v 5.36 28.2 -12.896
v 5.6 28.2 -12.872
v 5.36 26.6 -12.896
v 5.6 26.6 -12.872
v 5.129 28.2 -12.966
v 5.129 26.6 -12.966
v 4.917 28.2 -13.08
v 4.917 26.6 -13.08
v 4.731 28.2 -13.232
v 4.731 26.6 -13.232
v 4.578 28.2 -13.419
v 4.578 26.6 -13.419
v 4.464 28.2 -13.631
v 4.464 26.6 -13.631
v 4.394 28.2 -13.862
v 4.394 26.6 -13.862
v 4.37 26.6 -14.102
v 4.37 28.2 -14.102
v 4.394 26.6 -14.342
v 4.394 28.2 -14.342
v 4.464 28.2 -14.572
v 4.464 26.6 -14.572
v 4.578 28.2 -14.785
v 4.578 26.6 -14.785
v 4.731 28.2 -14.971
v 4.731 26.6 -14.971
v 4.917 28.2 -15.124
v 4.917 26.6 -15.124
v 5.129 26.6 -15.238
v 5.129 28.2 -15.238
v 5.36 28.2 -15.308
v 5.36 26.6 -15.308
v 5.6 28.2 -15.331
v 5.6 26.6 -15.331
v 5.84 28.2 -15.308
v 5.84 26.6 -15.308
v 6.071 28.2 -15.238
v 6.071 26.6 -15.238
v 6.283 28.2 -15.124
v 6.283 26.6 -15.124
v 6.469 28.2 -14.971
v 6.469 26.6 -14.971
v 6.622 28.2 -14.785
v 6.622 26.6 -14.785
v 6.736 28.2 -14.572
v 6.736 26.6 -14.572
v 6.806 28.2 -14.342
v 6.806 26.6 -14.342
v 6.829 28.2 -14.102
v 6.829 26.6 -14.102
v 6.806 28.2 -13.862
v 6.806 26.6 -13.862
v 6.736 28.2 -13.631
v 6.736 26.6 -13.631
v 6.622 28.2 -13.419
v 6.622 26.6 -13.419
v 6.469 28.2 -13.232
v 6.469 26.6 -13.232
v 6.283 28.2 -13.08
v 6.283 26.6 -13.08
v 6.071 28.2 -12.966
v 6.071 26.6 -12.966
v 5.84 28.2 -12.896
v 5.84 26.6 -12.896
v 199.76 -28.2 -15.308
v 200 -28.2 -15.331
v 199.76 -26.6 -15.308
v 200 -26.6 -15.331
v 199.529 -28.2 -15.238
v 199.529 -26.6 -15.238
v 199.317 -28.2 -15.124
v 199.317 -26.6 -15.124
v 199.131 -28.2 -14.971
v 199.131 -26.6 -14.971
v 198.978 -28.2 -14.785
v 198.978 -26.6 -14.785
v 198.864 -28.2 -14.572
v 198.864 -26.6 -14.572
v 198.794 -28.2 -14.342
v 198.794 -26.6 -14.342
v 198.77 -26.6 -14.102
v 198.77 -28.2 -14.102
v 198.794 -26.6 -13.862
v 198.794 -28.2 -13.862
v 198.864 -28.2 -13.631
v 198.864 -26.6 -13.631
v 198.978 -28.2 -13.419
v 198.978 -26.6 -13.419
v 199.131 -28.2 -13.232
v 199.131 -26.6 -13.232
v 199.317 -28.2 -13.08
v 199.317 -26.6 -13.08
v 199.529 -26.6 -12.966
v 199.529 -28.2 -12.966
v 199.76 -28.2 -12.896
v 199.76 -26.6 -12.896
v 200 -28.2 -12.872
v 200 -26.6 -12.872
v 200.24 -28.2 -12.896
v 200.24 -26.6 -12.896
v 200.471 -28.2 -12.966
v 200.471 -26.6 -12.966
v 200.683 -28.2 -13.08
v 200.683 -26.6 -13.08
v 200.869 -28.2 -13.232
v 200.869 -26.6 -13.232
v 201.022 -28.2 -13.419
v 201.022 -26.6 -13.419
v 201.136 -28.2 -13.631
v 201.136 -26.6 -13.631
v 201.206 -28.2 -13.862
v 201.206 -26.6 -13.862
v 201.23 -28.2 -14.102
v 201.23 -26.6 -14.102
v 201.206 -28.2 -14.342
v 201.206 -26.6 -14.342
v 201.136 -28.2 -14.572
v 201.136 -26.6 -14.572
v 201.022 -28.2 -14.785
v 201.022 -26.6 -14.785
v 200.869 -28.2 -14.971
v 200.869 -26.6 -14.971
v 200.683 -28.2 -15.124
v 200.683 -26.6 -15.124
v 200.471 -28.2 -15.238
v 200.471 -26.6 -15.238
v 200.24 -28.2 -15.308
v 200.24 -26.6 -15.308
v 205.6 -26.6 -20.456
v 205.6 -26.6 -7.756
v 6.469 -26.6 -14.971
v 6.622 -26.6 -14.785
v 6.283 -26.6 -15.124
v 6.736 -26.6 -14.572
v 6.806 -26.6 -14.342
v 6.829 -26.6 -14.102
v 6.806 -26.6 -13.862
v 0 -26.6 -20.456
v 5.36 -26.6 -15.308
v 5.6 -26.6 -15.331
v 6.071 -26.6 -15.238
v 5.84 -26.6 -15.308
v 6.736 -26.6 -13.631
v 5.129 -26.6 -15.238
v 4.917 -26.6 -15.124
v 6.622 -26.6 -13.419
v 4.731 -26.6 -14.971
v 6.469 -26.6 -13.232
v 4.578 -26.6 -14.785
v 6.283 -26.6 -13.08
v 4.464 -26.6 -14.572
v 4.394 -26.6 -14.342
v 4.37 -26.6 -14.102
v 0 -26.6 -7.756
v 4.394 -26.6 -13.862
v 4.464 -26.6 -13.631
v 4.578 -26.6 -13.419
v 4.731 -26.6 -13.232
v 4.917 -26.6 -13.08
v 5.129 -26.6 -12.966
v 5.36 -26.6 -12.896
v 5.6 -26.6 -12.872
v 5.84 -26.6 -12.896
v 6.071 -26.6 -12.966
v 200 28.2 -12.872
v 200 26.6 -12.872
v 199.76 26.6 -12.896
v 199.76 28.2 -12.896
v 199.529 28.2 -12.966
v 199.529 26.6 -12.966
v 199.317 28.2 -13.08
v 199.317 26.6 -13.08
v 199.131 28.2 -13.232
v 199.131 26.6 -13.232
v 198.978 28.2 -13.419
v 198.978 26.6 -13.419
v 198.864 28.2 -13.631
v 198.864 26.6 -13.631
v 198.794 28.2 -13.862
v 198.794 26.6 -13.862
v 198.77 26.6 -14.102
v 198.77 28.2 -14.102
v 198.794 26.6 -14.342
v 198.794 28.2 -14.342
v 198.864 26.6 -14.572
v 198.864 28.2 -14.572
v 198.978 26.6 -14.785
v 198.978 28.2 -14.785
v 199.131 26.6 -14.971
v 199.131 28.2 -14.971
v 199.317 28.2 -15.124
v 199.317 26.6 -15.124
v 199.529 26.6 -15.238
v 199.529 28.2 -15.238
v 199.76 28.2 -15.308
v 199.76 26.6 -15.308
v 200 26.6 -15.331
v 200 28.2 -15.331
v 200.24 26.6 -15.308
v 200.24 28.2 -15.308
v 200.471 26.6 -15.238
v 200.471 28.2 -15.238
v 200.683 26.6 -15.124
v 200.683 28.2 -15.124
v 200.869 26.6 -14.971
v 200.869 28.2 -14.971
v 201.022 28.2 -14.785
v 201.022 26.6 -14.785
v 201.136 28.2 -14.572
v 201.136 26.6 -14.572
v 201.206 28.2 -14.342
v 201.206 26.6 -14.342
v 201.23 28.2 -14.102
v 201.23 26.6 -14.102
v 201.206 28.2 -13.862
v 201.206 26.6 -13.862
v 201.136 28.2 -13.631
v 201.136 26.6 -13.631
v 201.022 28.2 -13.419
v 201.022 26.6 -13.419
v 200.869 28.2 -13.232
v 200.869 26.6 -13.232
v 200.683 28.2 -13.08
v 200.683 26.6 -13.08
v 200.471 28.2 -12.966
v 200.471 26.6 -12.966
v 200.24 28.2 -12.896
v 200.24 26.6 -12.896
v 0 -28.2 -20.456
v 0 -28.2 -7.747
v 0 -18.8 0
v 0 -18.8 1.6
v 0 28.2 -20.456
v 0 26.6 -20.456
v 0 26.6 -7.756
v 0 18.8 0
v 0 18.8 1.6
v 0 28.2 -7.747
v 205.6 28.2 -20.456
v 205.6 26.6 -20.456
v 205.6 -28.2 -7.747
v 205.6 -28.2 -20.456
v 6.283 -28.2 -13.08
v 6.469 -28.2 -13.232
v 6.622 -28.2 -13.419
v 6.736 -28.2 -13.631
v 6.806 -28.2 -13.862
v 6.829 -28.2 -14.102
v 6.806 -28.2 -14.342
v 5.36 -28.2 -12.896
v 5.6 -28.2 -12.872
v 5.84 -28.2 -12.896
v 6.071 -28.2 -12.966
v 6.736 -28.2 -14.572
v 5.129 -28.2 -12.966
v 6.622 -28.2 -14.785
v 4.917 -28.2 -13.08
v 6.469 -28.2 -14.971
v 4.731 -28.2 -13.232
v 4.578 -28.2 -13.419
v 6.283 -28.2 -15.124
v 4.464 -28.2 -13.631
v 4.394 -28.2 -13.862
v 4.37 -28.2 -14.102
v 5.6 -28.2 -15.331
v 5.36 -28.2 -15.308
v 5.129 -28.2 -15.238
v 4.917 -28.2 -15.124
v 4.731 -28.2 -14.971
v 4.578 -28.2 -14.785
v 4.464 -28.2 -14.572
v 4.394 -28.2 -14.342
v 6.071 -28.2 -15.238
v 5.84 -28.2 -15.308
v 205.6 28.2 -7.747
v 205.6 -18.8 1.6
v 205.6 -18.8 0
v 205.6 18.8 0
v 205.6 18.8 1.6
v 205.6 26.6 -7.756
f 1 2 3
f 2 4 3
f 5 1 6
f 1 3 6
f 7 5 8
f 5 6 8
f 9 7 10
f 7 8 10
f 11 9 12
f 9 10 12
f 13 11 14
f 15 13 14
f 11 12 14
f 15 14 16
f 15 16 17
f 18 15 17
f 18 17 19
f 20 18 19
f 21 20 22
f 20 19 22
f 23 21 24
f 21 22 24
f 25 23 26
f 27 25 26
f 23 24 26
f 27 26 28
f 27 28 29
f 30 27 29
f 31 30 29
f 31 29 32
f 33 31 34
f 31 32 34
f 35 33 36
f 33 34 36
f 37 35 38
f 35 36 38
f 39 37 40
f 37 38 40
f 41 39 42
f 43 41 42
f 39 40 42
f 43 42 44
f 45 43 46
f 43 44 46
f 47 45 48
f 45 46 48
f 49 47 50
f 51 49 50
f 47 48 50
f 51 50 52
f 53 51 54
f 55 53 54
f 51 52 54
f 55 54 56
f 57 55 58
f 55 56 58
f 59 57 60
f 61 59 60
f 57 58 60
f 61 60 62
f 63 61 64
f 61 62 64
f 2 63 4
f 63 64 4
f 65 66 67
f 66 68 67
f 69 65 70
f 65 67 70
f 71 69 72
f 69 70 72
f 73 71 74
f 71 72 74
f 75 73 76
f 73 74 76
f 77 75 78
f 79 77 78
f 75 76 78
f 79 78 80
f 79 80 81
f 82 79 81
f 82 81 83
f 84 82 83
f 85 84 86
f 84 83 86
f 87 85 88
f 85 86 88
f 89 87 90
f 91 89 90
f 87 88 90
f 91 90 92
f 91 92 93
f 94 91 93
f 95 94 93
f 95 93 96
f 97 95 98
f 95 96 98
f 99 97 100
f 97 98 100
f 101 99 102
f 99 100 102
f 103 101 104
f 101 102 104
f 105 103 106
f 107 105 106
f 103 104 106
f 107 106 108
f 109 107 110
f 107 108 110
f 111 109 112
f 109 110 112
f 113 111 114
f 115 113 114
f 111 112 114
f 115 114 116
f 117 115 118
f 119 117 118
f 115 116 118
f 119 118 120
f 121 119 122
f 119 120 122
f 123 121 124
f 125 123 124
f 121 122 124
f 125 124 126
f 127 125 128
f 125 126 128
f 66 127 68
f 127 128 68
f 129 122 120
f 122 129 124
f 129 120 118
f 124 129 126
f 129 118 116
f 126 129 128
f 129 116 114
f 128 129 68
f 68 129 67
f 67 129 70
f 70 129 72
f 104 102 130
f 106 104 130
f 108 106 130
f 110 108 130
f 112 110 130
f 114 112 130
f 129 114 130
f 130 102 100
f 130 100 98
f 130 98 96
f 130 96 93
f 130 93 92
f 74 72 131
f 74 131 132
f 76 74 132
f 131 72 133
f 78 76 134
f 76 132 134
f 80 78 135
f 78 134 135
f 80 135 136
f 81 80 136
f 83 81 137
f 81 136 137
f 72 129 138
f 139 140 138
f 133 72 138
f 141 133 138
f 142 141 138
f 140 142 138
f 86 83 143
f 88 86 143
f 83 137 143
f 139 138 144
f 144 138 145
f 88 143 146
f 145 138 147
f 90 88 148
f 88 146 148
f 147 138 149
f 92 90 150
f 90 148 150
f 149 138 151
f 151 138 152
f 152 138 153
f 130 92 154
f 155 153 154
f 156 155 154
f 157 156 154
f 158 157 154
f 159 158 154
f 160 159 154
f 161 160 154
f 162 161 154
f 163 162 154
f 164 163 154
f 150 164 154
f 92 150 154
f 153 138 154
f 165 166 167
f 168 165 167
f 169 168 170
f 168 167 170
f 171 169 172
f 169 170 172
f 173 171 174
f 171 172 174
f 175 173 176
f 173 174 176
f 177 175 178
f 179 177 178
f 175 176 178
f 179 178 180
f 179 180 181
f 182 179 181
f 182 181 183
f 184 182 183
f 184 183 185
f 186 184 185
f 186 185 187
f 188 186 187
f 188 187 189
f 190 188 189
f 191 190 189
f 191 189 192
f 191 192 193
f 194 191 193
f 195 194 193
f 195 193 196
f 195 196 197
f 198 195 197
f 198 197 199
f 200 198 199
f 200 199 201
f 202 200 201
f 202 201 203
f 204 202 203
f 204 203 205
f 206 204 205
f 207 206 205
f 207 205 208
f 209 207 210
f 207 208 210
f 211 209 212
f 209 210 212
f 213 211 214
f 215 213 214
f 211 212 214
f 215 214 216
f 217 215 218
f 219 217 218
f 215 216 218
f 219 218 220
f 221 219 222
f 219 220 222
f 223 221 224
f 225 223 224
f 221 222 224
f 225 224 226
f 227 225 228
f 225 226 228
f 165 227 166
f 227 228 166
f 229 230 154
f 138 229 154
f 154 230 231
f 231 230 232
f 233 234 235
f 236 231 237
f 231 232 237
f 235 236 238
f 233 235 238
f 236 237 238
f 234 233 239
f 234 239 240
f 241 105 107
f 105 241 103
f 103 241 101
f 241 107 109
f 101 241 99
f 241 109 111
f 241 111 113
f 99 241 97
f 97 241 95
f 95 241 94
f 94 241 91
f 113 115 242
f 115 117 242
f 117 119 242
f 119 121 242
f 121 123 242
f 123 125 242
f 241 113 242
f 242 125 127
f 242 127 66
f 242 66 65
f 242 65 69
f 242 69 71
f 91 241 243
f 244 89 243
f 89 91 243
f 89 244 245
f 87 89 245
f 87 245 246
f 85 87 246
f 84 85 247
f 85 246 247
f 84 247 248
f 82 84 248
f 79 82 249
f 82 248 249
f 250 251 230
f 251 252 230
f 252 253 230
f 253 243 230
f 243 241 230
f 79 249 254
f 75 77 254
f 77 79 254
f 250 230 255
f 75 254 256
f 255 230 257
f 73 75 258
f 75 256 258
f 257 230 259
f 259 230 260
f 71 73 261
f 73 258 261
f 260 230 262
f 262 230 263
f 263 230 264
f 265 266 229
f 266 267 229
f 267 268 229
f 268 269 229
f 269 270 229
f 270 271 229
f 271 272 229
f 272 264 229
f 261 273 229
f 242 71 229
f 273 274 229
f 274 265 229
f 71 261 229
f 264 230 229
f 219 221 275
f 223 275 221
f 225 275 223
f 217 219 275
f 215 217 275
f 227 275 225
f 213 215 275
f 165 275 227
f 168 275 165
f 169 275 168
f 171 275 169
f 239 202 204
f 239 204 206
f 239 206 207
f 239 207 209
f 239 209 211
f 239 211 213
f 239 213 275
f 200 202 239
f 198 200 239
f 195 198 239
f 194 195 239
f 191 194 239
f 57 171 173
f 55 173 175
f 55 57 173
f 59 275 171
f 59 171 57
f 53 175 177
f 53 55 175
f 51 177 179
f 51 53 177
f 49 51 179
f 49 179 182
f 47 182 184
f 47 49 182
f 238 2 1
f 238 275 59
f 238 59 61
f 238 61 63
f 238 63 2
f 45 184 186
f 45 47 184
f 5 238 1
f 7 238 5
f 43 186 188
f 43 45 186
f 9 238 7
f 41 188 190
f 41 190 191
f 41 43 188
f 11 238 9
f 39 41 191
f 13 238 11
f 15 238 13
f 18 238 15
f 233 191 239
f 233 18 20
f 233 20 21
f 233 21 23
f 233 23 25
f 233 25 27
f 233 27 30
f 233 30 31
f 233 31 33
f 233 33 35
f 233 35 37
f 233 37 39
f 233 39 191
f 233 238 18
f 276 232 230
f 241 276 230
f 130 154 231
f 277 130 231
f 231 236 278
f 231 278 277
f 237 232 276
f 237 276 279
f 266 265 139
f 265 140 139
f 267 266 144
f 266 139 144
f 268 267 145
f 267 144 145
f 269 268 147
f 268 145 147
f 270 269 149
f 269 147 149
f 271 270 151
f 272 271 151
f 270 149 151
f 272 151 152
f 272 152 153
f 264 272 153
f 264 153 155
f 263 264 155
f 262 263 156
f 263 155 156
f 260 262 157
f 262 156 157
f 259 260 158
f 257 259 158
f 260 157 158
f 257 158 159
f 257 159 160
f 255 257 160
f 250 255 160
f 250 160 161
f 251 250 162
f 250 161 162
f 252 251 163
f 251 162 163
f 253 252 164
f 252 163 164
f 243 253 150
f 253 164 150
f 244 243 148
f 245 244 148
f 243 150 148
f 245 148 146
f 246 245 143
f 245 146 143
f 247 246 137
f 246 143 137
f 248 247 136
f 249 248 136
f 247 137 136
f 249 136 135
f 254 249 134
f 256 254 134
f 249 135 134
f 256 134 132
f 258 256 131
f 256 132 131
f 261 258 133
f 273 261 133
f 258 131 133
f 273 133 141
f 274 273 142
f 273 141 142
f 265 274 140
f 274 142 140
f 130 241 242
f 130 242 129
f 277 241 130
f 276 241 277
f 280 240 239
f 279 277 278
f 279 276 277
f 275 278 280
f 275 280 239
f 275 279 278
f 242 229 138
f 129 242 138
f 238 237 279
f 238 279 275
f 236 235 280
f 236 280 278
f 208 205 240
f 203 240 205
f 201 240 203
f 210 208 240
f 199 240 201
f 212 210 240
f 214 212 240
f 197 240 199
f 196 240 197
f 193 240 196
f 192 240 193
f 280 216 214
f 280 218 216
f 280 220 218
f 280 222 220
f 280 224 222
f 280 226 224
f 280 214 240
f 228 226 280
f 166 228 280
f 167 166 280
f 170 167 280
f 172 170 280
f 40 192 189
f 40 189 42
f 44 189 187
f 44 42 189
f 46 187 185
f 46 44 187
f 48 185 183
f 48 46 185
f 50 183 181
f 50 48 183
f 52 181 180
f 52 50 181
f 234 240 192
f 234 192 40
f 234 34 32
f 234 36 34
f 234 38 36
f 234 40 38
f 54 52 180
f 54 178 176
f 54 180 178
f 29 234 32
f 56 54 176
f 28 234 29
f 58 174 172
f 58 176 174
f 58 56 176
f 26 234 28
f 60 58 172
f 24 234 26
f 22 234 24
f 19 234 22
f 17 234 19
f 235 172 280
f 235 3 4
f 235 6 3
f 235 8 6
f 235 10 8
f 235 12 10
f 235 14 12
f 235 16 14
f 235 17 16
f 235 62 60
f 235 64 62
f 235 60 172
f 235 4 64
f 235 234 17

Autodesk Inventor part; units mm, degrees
ref_plane "YZ Plane" through (0, 0, 0) normal (1, 0, 0) x (0, 1, 0)
ref_plane "XZ Plane" through (0, 0, 0) normal (0, 1, 0) x (-1, 0, 0)
ref_plane "XY Plane" through (0, 0, 0) normal (0, 0, 1) x (1, 0, 0)
sketch "Sketch1" plane through (0, 0, 0) normal (1, 0, 0) x (0, 1, 0)
  line L0 (18.8, 0) -> (-18.8, 0)
  line L1 (-18.8, 0) -> (-18.8, 1.6)
  line L2 (-18.8, 1.6) -> (18.8, 1.6)
  line L3 (18.8, 1.6) -> (18.8, 0)
  line L4 (18.8, 1.6) -> (28.2, -7.7473)
  line L5 (28.2, -7.7473) -> (28.2, -20.4563)
  line L6 (28.2, -20.4563) -> (26.6, -20.4563)
  line L7 (26.6, -20.4563) -> (26.6, -7.7563)
  line L8 (26.6, -7.7563) -> (18.8, 0)
  line L9 (0, 0) -> (0, 1.6)
  line L10 (-18.8, 1.6) -> (-28.2, -7.7473)
  line L11 (-28.2, -7.7473) -> (-28.2, -20.4563)
  line L12 (-26.6, -20.4563) -> (-26.6, -7.7563)
  line L13 (-26.6, -7.7563) -> (-18.8, 0)
  line L14 (-28.2, -20.4563) -> (-26.6, -20.4563)
  dimension "d0" = 1.6
  dimension "d1" = 1.6
  dimension "d3" = 11
  dimension "d4" = 12.7
  dimension "d5" = 56.4
  dimension "d8" = 7.8
extrude "Extrusion1" add sketch "Sketch1" along normal blind 205.6
sketch "Sketch2" plane through (0, 28.2, -7.7473) normal (0, 1, 0) x (1, 0, 0)
  line L0 (0, 12.709) -> (0, 0) projected
  line L1 (0, 0) -> (205.6, 0) projected
  line L2 (205.6, 12.709) -> (205.6, 0) projected
  line L3 (0, 12.709) -> (205.6, 12.709) projected
  point P0 (0, -7.7473)
  point P1 (5.6, 6.3545)
  point P2 (200, 6.3545)
  point P3 (0, 6.3545)
  point P4 (205.6, 6.3545)
  dimension "d11" = 5.6
  dimension "d12" = 5.6
hole "Hole1" at (5.6, 28.2, -14.1018) at (200, 28.2, -14.1018) direction (0, -1, 0) diameter 2.459 end up to surface
sketch "Sketch3" plane through (0, -28.2, -20.4563) normal (0, -1, 0) x (1, 0, 0)
  circle A0 centre (200, 6.3545) radius 1.2295 projected
  circle A1 centre (5.6, 6.3545) radius 1.2295 projected
  point P0 (0, 20.4563)
hole "Hole2" at (200, -28.2, -14.1018) at (5.6, -28.2, -14.1018) direction (0, 1, 0) diameter 2.459 end up to surface
equation "\"d12\" = d11"
properties part number "ChassisMainBracket"
